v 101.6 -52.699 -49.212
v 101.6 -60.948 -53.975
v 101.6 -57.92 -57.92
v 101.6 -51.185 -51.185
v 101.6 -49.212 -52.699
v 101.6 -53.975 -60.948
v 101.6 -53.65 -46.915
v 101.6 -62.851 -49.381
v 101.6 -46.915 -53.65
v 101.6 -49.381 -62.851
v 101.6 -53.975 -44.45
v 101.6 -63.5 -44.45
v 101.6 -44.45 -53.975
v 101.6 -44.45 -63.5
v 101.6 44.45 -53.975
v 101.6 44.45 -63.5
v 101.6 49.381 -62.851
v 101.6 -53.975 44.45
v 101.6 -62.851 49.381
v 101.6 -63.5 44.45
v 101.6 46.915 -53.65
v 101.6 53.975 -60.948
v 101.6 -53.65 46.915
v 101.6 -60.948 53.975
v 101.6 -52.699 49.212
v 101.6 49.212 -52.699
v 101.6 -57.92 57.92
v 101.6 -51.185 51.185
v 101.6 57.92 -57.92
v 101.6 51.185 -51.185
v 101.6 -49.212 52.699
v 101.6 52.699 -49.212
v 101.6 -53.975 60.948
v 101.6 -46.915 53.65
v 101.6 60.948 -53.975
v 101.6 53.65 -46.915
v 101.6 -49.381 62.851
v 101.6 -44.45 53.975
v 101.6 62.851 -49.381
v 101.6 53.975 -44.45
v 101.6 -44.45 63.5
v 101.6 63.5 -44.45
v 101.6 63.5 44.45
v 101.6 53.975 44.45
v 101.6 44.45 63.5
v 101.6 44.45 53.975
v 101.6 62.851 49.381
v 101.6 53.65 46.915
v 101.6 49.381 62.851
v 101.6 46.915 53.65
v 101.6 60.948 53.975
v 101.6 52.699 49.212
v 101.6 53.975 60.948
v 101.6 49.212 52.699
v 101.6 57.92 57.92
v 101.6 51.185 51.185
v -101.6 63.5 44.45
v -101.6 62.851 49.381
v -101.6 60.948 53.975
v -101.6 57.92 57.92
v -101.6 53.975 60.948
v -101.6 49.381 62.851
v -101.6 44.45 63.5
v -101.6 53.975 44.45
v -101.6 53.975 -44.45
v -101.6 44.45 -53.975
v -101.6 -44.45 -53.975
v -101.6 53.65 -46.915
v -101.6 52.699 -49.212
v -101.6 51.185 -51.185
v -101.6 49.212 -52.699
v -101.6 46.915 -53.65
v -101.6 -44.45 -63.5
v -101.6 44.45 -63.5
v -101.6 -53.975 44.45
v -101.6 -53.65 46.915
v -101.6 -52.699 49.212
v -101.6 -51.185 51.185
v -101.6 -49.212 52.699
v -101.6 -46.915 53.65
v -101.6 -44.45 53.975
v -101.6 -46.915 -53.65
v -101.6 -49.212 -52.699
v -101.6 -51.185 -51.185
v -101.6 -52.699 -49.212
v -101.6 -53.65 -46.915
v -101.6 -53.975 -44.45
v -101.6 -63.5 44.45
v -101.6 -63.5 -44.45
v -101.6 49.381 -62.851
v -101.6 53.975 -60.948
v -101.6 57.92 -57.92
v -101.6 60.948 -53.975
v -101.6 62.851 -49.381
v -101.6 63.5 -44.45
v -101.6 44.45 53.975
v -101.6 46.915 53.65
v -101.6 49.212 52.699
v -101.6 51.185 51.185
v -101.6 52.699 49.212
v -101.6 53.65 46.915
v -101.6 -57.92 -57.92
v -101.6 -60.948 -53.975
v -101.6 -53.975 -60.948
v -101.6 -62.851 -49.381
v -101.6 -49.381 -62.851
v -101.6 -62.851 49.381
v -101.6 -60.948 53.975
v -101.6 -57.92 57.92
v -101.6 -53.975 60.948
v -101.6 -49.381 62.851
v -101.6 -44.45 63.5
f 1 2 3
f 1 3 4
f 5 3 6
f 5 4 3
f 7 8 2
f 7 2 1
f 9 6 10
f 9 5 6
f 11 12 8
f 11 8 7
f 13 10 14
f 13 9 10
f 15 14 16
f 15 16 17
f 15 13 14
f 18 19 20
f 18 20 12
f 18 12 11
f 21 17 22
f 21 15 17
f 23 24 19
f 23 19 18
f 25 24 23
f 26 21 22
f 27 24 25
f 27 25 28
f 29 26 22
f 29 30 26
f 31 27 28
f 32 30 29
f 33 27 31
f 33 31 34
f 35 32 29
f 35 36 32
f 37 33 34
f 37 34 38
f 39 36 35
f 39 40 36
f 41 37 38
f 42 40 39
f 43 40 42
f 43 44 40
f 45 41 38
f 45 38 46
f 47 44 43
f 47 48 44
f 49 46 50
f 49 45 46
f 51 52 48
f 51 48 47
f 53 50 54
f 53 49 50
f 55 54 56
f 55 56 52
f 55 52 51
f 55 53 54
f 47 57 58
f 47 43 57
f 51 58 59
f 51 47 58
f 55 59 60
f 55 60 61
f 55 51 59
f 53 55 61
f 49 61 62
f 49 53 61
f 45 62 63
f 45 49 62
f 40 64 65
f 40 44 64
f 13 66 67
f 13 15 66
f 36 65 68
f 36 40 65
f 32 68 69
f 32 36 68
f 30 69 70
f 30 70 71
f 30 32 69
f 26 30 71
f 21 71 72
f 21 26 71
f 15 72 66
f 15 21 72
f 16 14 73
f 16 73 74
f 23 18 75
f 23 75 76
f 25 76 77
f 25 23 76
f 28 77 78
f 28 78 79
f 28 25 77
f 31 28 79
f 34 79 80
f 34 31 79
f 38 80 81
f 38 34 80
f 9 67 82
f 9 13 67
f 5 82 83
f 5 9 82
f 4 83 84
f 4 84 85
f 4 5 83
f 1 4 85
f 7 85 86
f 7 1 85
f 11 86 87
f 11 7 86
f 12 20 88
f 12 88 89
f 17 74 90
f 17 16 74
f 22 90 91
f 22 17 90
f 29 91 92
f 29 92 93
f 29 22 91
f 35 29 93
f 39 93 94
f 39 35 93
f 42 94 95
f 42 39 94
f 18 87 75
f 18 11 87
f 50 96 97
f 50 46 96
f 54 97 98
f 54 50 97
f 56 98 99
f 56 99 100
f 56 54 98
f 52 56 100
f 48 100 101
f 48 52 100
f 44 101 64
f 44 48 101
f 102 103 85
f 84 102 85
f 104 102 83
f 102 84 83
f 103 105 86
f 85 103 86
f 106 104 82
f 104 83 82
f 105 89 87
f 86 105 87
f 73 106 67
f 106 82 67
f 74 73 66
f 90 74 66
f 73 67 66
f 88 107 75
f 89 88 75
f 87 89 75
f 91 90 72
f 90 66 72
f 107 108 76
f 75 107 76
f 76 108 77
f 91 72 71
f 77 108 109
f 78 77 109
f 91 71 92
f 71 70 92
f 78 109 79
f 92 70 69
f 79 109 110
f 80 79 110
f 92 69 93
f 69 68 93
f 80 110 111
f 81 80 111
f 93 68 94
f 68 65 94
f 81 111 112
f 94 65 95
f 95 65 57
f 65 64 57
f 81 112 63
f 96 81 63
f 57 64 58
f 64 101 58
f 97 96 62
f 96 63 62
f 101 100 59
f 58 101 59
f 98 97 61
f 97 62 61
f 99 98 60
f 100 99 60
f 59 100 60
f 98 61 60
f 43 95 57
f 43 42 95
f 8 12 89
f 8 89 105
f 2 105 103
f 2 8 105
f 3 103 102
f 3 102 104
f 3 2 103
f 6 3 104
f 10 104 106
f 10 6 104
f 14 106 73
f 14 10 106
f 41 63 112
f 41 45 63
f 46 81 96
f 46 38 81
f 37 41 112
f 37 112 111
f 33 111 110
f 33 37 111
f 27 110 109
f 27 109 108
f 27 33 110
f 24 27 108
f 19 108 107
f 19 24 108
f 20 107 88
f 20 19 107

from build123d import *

# Parameters (mm, degrees)
F2_DEPTH = 101.6


# Not quite as in the source:
# - a variable given as a bare number and used for a length is read in inches; the dataset says mm whatever the document's units were


with BuildPart() as f2:
    # F1 (on Right) → F2 (new body, symmetric)
    with BuildSketch(Plane.YZ):
        with BuildLine():
            Line((44.45, 63.5), (-44.45, 63.5))
            ThreePointArc((-44.45, 63.5), (-57.9203841816, 57.9203841816), (-63.5, 44.45))
            Line((-63.5, 44.45), (-63.5, -44.45))
            ThreePointArc((-63.5, -44.45), (-57.9203841816, -57.9203841816), (-44.45, -63.5))
            Line((-44.45, -63.5), (44.45, -63.5))
            ThreePointArc((44.45, -63.5), (57.9203841816, -57.9203841816), (63.5, -44.45))
            Line((63.5, -44.45), (63.5, 44.45))
            ThreePointArc((63.5, 44.45), (57.9203841816, 57.9203841816), (44.45, 63.5))
        make_face()
        with BuildLine():
            ThreePointArc((-53.975, 44.45), (-51.1851920908, 51.1851920908), (-44.45, 53.975))
            Line((-44.45, 53.975), (44.45, 53.975))
            ThreePointArc((44.45, 53.975), (51.1851920908, 51.1851920908), (53.975, 44.45))
            Line((53.975, 44.45), (53.975, -44.45))
            ThreePointArc((53.975, -44.45), (51.1851920908, -51.1851920908), (44.45, -53.975))
            Line((44.45, -53.975), (-44.45, -53.975))
            ThreePointArc((-44.45, -53.975), (-51.1851920908, -51.1851920908), (-53.975, -44.45))
            Line((-53.975, -44.45), (-53.975, 44.45))
        make_face(mode=Mode.SUBTRACT)
    extrude(amount=F2_DEPTH, both=True)


solid = f2.part
